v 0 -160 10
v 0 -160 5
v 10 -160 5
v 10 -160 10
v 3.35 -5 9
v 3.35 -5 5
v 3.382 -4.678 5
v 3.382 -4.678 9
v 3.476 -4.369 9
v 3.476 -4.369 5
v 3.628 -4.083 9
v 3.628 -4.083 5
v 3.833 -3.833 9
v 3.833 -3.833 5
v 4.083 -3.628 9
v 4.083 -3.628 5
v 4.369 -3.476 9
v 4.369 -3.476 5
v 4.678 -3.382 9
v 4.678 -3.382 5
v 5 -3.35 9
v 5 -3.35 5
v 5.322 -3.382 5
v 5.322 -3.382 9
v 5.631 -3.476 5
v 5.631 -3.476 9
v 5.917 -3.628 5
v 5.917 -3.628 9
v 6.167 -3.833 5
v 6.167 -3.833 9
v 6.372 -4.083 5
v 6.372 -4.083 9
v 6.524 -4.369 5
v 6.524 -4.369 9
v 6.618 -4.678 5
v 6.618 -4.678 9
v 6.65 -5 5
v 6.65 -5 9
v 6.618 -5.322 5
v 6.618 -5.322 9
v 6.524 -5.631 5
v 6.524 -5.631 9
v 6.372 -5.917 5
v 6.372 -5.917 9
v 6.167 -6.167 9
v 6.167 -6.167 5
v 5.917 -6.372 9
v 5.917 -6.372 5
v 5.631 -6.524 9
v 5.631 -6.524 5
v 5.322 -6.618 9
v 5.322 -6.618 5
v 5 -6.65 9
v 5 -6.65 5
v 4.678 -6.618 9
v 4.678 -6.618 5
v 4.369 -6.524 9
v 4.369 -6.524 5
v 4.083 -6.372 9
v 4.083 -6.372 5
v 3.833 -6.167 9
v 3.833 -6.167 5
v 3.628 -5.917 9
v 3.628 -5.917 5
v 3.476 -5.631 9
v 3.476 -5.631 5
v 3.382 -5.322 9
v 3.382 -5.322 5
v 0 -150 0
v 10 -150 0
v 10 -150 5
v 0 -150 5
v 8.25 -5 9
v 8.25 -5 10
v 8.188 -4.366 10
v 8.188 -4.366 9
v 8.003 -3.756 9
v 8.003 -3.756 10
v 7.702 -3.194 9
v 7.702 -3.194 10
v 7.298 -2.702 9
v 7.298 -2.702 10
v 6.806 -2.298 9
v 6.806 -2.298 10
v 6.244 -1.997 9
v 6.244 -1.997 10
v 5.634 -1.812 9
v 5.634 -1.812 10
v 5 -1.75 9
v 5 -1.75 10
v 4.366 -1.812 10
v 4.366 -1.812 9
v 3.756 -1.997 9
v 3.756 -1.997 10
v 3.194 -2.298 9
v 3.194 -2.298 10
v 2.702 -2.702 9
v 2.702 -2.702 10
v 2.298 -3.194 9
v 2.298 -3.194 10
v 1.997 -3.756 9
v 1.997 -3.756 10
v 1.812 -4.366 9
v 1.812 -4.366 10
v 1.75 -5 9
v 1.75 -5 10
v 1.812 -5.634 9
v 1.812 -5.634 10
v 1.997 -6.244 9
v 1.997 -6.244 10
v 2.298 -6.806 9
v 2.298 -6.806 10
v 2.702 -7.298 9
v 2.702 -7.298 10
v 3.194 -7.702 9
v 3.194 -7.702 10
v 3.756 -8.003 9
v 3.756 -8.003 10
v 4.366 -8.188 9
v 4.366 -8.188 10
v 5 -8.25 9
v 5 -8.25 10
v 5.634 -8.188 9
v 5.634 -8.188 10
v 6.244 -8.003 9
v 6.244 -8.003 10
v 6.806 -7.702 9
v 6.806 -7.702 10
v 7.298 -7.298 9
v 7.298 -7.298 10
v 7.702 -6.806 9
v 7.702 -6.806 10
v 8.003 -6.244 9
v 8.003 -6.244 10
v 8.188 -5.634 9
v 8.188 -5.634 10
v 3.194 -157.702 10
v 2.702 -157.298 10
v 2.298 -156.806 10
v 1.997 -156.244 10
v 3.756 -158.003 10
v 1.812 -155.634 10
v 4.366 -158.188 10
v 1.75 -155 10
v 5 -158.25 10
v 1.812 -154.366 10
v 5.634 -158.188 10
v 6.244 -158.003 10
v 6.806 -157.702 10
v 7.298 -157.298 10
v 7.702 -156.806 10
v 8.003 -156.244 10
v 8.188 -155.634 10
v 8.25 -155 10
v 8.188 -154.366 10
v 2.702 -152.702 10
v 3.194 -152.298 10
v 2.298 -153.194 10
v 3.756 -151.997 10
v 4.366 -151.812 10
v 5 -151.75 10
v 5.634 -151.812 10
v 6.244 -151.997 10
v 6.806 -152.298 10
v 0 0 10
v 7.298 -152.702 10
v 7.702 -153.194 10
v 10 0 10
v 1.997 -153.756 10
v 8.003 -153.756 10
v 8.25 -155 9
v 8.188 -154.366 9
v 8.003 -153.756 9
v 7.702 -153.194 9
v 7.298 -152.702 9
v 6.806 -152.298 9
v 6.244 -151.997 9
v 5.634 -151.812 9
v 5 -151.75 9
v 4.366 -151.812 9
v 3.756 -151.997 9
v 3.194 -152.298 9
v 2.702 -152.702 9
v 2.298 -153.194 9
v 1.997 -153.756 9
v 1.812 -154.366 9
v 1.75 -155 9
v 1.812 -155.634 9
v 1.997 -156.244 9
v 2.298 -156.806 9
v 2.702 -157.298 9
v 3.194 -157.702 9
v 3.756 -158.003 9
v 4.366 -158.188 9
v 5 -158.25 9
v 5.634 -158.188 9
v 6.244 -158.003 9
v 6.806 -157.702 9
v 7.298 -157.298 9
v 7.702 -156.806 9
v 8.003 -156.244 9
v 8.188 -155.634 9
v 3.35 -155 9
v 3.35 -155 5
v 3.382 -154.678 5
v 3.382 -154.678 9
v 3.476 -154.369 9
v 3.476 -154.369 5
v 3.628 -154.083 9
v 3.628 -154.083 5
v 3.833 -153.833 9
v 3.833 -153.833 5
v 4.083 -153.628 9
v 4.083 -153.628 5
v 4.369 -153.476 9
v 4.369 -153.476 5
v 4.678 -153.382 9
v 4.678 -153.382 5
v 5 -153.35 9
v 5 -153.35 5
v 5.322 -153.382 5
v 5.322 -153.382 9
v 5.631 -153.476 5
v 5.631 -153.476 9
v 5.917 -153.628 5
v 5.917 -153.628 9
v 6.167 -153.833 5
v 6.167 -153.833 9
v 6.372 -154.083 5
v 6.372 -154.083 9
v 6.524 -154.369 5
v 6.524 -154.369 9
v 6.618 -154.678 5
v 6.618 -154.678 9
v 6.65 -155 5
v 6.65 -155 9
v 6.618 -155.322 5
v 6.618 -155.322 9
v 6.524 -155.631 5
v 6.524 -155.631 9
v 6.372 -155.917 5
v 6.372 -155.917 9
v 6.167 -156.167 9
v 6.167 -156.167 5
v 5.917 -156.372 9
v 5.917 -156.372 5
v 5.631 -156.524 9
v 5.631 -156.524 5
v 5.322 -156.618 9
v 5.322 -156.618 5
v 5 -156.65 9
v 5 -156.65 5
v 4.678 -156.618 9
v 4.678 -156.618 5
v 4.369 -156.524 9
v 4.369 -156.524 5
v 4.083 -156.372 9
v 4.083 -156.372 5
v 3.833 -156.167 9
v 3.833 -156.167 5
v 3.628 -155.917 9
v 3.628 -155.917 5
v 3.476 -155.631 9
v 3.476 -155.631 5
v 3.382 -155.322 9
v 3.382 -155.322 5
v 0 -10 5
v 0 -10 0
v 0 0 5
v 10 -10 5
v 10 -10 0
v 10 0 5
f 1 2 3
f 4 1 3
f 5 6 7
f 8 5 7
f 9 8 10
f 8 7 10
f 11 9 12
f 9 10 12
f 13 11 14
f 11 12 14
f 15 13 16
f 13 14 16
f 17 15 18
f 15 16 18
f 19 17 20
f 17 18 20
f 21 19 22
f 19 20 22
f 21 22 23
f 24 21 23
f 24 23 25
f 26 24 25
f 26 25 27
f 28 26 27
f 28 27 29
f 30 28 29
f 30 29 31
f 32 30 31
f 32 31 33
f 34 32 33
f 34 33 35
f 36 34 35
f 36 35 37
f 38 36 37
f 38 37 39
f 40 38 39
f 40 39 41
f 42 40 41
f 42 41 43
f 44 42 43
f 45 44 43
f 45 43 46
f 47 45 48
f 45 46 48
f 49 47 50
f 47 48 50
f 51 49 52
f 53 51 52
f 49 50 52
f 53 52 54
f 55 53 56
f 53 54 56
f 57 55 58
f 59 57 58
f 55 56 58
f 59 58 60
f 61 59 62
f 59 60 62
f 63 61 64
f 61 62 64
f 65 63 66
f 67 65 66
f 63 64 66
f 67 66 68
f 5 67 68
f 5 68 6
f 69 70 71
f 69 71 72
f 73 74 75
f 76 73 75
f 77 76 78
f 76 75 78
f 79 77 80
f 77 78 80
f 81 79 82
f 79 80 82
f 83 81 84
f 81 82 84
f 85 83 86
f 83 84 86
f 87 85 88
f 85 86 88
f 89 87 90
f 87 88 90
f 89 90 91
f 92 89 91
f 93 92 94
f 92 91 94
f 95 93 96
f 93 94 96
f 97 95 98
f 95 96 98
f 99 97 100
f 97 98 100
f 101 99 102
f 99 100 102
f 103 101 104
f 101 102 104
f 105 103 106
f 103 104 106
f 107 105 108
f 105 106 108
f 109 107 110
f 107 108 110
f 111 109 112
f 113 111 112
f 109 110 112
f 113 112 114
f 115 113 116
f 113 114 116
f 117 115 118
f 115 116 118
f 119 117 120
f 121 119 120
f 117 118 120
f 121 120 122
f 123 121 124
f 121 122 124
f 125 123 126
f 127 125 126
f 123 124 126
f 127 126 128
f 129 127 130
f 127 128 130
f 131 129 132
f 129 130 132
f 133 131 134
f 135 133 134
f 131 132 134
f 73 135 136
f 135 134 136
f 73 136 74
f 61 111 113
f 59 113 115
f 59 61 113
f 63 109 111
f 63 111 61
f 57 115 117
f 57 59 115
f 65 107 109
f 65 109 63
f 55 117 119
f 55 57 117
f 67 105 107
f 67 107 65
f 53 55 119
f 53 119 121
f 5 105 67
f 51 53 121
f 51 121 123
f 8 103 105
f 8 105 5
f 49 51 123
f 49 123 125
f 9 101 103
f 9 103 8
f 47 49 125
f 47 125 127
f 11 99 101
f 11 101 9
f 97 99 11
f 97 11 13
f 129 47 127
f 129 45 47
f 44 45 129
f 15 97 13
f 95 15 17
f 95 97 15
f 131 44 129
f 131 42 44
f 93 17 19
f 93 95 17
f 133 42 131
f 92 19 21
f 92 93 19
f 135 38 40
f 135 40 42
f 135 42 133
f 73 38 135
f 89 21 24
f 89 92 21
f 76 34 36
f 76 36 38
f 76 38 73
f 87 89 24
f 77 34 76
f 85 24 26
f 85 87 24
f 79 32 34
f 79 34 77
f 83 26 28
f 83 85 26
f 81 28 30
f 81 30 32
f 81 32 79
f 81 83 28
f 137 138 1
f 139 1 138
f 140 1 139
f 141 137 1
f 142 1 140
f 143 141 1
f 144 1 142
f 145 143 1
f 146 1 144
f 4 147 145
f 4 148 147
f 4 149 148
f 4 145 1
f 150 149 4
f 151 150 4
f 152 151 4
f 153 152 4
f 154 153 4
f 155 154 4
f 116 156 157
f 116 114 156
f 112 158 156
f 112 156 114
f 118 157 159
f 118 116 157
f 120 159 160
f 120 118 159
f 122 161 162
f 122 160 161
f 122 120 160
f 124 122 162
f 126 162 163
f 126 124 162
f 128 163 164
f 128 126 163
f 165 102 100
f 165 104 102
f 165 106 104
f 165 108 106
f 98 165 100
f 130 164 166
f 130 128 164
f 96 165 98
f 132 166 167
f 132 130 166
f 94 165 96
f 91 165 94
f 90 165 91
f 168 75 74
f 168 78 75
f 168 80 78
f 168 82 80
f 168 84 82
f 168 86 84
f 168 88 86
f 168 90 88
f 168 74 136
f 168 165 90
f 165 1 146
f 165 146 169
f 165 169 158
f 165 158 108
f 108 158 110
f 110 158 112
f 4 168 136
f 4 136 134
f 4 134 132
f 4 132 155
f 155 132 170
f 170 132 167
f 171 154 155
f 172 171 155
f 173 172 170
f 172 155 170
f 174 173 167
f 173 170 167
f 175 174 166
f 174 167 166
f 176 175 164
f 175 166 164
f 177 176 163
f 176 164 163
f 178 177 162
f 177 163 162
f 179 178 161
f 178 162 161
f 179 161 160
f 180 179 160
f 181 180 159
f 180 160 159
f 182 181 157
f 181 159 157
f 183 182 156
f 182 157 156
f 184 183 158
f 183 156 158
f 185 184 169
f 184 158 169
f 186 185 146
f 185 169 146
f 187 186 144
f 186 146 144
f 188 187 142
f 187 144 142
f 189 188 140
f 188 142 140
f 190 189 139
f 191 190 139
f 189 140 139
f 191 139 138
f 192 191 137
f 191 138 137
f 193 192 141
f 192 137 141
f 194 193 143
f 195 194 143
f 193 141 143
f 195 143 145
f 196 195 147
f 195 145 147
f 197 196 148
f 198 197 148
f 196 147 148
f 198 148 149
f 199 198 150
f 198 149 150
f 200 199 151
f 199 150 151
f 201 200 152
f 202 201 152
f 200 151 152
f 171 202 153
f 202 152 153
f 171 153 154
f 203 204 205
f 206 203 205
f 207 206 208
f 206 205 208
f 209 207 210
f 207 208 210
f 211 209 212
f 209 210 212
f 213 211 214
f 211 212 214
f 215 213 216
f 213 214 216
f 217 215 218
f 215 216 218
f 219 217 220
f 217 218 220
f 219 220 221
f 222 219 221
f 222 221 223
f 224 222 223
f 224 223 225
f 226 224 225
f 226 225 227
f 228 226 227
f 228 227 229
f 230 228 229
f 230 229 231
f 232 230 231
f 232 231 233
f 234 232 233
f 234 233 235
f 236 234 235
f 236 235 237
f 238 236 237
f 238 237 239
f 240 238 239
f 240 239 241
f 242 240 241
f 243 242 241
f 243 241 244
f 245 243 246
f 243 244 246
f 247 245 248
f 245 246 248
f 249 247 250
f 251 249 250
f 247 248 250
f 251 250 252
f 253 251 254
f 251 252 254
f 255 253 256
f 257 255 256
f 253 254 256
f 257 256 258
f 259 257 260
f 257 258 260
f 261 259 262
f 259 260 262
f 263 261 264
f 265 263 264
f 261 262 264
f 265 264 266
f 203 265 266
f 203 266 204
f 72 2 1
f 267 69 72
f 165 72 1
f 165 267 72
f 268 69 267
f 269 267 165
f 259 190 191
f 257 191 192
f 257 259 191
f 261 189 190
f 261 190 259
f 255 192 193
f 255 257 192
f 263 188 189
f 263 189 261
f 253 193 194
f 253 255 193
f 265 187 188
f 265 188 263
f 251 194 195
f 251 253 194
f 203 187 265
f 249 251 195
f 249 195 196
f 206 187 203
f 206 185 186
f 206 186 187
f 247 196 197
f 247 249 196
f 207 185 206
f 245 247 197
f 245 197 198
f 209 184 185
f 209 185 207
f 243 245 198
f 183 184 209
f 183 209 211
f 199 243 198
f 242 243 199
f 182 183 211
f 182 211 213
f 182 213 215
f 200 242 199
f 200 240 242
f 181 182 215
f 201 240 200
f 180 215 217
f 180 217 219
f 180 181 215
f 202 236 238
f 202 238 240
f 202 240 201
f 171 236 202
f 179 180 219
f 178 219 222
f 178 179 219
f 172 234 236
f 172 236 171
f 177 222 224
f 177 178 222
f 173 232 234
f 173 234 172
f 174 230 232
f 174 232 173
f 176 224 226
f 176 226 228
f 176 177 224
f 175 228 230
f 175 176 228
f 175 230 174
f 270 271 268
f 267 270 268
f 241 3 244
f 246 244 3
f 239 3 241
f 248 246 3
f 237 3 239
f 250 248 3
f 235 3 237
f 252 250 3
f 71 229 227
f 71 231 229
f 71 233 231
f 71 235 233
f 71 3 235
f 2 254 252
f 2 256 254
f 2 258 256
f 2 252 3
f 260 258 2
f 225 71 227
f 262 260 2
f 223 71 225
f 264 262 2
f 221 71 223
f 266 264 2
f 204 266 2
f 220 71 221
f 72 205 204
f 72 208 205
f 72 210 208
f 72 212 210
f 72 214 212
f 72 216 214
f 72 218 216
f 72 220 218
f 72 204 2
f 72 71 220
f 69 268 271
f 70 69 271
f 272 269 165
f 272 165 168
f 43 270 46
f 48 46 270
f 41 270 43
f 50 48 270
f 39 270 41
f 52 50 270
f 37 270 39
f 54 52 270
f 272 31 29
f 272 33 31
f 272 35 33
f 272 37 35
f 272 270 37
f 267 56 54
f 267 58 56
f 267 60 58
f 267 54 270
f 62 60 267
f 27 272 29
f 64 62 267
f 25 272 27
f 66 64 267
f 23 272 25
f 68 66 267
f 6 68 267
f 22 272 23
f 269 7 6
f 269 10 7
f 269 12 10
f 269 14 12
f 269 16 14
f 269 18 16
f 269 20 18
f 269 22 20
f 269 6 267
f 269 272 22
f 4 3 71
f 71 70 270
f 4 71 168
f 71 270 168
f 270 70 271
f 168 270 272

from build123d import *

# Parameters (mm, degrees)
SKETCH_1_W          = 10
SKETCH_1_H          = 160
EXTRUDE_1_DEPTH     = 10
SKETCH_3_W          = 10
SKETCH_3_H          = 10
CUT_EXTRUDE_1_DEPTH = 5
HOLE_WIZARD_M4_1_D  = 3.3
SKETCH_7_R          = 3.25
CUT_EXTRUDE_2_DEPTH = 1


with BuildPart() as part:
    # 草图1 → 凸台-拉伸1 (new body)
    with BuildSketch(Plane.XY):
        with Locations((5, -80)):
            Rectangle(SKETCH_1_W, SKETCH_1_H)
    extrude(amount=EXTRUDE_1_DEPTH)

    # 草图3 → 切除-拉伸1 (cut)
    with BuildSketch(Plane(origin=(0, 0, 0), x_dir=(-1, 0, 0), z_dir=(0, 0, -1))):
        with Locations((-5, -5)):
            Rectangle(SKETCH_3_W, SKETCH_3_H)
        with Locations((-5, -155)):
            Rectangle(SKETCH_3_W, SKETCH_3_H)
    extrude(amount=-CUT_EXTRUDE_1_DEPTH, mode=Mode.SUBTRACT)

    # M4 螺纹孔的螺纹孔钻头1 (through all)
    with Locations(Plane.XY.offset(10)):
        with Locations((5, -5), (5, -155)):
            Hole(HOLE_WIZARD_M4_1_D / 2)

    # 草图7 → 切除-拉伸2 (cut)
    with BuildSketch(Plane.XY.offset(10)):
        with Locations((5, -5)):
            Circle(SKETCH_7_R)
        with Locations((5, -155)):
            Circle(SKETCH_7_R)
    extrude(amount=-CUT_EXTRUDE_2_DEPTH, mode=Mode.SUBTRACT)


solid = part.part
